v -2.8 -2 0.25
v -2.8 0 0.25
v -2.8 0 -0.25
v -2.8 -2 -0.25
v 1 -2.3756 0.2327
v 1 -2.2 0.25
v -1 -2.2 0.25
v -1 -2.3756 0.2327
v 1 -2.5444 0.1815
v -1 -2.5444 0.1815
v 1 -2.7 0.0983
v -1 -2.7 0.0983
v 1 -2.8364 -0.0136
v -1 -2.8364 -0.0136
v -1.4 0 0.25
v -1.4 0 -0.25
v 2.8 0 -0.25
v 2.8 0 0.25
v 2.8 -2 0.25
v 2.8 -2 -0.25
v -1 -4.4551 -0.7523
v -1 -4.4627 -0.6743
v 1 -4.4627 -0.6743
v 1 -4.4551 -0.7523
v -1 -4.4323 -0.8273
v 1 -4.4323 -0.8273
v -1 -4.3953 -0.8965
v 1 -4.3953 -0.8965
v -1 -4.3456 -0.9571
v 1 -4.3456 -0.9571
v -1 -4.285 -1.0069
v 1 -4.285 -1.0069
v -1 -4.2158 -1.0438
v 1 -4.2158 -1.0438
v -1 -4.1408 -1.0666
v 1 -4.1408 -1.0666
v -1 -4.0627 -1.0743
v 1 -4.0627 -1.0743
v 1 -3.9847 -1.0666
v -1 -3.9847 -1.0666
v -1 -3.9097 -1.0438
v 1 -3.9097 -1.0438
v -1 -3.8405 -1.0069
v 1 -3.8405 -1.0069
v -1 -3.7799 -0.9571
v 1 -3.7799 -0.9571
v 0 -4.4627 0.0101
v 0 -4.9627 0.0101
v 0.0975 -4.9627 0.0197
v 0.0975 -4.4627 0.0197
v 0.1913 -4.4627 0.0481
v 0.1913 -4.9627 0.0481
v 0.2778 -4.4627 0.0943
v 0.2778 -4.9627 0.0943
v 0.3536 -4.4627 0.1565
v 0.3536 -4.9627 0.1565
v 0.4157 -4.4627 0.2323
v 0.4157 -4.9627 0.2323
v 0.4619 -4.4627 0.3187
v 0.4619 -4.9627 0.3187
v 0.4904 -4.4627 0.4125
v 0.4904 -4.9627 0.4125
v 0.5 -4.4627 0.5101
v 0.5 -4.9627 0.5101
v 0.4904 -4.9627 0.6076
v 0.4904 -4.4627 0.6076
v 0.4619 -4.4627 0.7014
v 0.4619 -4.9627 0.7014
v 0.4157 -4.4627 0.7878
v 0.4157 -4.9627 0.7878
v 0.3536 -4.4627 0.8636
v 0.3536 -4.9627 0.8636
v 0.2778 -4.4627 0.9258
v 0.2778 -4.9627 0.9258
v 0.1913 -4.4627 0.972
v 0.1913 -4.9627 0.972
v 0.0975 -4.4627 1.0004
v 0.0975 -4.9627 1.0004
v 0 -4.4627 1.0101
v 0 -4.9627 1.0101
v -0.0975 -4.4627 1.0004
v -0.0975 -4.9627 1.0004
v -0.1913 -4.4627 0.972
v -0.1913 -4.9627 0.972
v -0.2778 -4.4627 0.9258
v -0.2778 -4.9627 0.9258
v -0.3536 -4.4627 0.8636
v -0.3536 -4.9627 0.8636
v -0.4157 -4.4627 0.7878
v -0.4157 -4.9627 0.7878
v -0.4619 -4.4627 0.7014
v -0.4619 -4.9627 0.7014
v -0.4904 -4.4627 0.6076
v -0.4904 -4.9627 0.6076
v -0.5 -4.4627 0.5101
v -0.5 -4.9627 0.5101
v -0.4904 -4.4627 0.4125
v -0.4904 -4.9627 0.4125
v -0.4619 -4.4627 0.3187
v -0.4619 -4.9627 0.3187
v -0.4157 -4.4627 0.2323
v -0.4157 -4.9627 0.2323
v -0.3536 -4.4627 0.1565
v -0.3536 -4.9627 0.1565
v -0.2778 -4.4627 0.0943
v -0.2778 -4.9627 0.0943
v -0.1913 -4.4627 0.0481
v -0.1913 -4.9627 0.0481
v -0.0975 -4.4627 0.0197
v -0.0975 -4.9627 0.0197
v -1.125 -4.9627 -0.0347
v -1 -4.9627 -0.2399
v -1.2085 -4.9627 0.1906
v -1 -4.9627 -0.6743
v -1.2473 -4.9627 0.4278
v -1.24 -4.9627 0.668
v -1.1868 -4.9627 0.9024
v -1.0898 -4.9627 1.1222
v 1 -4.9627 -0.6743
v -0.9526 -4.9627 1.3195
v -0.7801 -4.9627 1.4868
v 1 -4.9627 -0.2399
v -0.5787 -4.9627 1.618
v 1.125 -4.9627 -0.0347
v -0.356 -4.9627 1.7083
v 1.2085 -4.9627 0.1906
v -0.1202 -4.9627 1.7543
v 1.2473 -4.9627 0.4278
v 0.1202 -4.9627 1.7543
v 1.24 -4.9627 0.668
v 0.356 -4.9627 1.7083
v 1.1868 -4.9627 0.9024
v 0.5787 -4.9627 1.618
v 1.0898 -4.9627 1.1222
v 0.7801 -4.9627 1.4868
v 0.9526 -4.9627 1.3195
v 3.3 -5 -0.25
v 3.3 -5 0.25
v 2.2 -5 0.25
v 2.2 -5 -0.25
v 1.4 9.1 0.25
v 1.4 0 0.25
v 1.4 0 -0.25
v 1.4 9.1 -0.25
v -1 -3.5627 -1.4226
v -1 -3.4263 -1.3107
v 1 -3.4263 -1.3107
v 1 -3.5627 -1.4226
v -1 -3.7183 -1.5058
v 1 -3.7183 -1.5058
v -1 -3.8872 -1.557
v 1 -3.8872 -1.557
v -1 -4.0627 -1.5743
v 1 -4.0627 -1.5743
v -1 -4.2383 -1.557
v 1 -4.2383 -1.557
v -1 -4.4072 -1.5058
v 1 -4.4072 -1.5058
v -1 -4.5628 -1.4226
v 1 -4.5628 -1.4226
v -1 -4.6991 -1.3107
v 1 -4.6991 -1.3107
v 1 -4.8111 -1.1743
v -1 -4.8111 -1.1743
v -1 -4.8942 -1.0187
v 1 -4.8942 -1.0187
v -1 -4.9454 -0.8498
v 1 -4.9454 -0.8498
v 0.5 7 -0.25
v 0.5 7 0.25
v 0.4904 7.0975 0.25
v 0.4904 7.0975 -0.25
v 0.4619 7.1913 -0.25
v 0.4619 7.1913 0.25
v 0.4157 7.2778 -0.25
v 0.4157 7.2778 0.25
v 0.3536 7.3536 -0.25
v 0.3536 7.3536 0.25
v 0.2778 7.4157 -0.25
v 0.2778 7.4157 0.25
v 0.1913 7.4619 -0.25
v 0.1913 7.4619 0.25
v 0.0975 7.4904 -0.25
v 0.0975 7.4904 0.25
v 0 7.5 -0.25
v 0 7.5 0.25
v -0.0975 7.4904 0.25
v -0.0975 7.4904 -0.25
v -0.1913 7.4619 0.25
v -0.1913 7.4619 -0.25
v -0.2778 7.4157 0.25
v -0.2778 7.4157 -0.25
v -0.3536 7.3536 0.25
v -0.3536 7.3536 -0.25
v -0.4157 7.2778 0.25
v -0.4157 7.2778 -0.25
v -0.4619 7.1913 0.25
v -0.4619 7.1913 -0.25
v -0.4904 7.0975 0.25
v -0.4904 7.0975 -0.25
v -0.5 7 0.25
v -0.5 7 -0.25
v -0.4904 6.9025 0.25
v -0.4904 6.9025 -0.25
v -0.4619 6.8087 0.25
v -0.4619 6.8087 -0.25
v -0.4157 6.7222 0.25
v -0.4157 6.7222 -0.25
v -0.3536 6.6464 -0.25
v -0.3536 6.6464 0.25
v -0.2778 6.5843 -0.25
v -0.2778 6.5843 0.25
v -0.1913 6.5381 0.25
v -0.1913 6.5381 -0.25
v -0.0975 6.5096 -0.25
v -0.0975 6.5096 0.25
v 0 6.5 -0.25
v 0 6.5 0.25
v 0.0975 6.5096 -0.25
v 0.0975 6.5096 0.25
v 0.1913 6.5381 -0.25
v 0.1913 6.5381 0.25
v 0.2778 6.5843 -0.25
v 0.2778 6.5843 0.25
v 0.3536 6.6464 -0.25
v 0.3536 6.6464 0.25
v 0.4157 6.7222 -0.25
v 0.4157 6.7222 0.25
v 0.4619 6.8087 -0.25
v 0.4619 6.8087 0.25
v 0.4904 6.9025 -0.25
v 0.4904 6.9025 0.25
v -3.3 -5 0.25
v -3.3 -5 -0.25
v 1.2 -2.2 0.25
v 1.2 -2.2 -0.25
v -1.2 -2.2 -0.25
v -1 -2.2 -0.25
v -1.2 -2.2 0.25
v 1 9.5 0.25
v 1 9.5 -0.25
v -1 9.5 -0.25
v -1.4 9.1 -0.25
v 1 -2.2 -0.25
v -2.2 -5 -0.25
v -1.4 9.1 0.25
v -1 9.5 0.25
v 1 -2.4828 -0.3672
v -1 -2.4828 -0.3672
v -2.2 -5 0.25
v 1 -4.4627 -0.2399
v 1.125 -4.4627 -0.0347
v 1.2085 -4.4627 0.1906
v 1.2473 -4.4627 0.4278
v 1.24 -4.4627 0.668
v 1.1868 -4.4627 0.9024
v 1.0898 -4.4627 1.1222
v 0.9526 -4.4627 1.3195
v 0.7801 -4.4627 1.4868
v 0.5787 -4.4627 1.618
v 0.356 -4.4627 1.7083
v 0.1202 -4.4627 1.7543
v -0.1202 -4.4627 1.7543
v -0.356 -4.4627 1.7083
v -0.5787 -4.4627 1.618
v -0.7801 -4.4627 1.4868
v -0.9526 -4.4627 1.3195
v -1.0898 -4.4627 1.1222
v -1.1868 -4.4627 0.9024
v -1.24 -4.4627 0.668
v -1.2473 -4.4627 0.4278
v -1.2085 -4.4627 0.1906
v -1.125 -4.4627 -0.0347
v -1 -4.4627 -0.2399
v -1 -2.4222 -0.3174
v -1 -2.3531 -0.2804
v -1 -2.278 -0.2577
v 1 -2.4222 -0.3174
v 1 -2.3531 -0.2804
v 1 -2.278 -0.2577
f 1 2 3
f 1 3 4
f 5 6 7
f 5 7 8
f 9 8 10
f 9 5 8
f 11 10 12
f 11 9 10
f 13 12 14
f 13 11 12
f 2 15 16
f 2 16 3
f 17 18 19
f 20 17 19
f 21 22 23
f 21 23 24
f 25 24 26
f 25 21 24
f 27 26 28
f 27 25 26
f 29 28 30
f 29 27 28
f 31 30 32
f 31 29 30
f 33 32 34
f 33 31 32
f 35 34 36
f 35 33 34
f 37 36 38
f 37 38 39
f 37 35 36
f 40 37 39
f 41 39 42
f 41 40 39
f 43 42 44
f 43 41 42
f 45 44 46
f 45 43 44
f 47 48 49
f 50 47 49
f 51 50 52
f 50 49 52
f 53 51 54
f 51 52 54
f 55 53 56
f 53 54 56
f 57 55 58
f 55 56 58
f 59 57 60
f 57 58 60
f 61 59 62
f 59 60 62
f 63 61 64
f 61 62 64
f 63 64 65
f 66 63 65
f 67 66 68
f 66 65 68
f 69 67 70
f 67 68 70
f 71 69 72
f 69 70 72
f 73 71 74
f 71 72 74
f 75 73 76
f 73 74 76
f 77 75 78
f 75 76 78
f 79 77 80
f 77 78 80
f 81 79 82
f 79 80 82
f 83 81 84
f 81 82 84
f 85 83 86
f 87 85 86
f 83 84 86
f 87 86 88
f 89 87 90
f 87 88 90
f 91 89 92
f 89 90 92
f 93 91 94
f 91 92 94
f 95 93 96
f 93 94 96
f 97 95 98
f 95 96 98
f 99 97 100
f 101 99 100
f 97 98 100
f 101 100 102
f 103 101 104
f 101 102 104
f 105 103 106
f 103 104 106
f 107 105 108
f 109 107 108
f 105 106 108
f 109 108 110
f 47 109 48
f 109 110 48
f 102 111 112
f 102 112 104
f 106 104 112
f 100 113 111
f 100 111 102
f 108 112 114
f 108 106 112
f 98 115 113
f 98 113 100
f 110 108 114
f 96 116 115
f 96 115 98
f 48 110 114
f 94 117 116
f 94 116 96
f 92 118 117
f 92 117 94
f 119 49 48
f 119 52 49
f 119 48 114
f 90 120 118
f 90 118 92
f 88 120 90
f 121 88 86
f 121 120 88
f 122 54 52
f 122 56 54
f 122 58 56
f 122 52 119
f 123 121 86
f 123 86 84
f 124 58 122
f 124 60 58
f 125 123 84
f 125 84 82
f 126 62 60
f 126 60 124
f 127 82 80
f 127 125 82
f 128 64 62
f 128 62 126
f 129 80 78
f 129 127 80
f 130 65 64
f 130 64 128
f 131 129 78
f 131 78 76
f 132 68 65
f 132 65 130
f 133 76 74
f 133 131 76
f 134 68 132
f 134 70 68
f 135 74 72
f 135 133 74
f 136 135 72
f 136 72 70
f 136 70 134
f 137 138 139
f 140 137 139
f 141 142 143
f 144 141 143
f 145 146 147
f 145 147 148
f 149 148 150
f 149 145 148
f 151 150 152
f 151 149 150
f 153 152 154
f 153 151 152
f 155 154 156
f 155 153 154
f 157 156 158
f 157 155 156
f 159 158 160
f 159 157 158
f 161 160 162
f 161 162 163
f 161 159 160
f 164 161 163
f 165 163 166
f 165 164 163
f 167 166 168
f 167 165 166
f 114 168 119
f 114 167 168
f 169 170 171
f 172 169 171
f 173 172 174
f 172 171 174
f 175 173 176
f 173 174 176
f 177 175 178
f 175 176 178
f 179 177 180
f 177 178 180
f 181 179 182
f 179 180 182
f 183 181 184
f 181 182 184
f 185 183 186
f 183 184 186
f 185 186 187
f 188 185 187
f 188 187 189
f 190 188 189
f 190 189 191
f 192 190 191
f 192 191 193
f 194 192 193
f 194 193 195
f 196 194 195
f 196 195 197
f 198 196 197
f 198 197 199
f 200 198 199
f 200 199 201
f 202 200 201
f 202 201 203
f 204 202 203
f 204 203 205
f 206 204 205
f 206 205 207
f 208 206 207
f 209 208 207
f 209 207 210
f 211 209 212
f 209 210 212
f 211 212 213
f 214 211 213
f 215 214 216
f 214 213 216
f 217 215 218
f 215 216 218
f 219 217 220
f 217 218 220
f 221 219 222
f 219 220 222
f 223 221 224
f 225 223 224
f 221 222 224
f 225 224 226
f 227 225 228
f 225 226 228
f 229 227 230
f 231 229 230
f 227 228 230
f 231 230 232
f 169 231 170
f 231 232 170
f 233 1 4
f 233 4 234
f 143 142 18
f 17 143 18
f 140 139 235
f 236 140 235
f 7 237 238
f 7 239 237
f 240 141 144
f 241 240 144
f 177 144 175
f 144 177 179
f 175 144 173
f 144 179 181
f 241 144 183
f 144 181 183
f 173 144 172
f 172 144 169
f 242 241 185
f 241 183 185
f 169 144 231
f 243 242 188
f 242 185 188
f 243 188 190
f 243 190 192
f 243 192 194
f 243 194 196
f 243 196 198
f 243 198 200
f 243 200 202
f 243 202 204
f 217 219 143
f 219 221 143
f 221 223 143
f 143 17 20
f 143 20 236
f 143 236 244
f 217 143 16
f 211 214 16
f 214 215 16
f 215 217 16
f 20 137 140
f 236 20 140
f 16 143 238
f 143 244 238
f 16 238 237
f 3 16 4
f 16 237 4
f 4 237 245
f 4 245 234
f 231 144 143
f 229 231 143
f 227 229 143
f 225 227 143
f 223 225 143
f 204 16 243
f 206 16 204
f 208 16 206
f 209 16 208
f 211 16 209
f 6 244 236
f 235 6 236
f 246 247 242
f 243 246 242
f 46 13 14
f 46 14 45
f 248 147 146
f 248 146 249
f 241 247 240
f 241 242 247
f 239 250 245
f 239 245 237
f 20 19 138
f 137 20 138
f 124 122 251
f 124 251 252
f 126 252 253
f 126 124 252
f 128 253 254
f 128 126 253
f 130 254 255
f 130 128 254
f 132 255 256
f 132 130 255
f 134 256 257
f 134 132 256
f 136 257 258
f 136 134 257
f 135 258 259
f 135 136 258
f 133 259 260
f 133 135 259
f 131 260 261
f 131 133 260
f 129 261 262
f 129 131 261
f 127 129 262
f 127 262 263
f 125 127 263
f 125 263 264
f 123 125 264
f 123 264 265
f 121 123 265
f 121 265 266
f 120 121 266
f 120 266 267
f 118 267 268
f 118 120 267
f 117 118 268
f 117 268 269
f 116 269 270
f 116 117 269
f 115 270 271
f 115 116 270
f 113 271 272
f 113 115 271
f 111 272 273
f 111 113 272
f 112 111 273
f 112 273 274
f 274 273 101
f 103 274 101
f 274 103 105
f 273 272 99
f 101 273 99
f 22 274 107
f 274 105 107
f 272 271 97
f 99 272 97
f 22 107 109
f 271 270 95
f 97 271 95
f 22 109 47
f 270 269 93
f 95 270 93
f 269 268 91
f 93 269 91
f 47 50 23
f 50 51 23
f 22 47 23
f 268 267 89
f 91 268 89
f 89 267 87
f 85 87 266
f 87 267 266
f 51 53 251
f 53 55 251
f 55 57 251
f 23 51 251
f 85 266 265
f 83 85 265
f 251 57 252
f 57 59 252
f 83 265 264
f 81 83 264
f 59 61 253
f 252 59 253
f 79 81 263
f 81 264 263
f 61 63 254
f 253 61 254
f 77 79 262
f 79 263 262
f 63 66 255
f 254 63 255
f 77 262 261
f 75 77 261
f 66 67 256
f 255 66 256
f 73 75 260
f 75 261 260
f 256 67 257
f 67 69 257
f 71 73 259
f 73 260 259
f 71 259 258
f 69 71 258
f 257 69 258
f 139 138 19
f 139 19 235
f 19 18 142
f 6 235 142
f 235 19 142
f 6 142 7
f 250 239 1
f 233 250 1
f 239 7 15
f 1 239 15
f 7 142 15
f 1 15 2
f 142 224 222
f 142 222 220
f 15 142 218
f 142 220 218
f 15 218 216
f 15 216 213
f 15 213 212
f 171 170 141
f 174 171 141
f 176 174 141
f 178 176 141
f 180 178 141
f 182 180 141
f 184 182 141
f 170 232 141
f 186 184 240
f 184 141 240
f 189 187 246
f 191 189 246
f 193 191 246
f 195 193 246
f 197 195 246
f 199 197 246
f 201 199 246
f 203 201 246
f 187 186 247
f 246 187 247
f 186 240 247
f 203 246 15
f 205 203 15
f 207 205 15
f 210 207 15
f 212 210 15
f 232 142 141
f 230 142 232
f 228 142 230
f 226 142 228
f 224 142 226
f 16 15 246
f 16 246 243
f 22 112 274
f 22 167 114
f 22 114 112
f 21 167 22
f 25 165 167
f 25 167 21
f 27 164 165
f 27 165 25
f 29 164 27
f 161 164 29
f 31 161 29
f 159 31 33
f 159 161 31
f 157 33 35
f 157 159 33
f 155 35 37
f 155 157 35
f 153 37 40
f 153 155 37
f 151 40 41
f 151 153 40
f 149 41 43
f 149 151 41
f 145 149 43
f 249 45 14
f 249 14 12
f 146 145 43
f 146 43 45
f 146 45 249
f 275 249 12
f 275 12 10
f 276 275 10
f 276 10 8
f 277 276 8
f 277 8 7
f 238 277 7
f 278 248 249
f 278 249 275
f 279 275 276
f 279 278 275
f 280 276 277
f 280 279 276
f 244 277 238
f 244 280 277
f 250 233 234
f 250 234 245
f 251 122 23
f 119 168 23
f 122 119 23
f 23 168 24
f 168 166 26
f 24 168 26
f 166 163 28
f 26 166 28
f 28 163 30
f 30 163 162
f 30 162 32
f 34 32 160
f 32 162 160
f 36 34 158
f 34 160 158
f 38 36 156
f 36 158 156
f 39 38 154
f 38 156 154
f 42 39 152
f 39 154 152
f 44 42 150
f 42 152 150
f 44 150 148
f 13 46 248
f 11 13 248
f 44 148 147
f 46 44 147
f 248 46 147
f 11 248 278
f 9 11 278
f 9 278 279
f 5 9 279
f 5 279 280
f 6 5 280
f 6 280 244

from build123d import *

# Parameters (mm, degrees)
MAINBODYS_W                           = 2.8
MAINBODYS_H                           = 0.5
MAIN_BODY_DEPTH                       = 9.5
BOTTOM_OF_MAIN_BODY_REACH             = 11.606
BOTTOM_OF_MAIN_BODY_DIRECTION_2_REACH = 11.606
TOPHOLES_R                            = 0.5
TOP_HOLE_DEPTH                        = 11.069260152
F_45_DEGREE_FLANGE_DEPTH              = 2
BOTTOM_FLAT_FLANGE_DEPTH              = 2
EXTENDEDBOTTOMFLANGES_W               = 2
EXTENDEDBOTTOMFLANGES_H               = 0.5
EXTENDED_BOTTOM_FLANGE_DEPTH          = 0.4
BOSSEDCYLINDERBODYS_R                 = 0.5
BOSSED_CYLINDER_BODY_DEPTH            = 0.5
C_MAIN_BODY_SIZE                      = 0.4


# Sheet-metal steps are written as plain solids
with BuildPart() as part:
    # MainBodyS → MAIN BODY (new body)
    with BuildSketch(Plane(origin=(0, 0, 0), x_dir=(1, 0, 0), z_dir=(0, 1, 0))):
        Rectangle(MAINBODYS_W, MAINBODYS_H)
    extrude(amount=MAIN_BODY_DEPTH)

    # BOTTOM OF MAIN BODY: up to this face of the body (flat: up to its plane)
    bottom_of_main_body_end = Plane(part.part.faces().sort_by_distance((0, 4.75, 0.25))[0])
    # BottomMainBodyS → BOTTOM OF MAIN BODY (add, up to the picked face)
    with BuildSketch(Plane.XY, mode=Mode.PRIVATE) as bottom_of_main_body_sk1:
        Polygon((0, 0), (2.8, 0), (2.8, -2), (3.3, -5), (2.2, -5), (1.2, -2.2), (0, -2.2), align=None)
    bottom_of_main_body_tool1 = split(extrude(bottom_of_main_body_sk1.sketch, amount=BOTTOM_OF_MAIN_BODY_REACH, mode=Mode.PRIVATE), bisect_by=bottom_of_main_body_end, keep=Keep.BOTH, mode=Mode.PRIVATE)
    bottom_of_main_body = bottom_of_main_body_tool1.solids().sort_by(Axis((1.768001, -2.02309, 0), (0, 0, 1)))[0]
    add(bottom_of_main_body)

    # BOTTOM OF MAIN BODY direction 2: up to this face of the body (flat: up to its plane)
    bottom_of_main_body_direction_2_end = Plane(part.part.faces().sort_by_distance((0, 4.75, -0.25))[0])
    # BottomMainBodyS → BOTTOM OF MAIN BODY direction 2 (add, up to the picked face)
    with BuildSketch(Plane.XY, mode=Mode.PRIVATE) as bottom_of_main_body_direction_2_sk1:
        Polygon((0, 0), (2.8, 0), (2.8, -2), (3.3, -5), (2.2, -5), (1.2, -2.2), (0, -2.2), align=None)
    bottom_of_main_body_direction_2_tool1 = split(extrude(bottom_of_main_body_direction_2_sk1.sketch, amount=-BOTTOM_OF_MAIN_BODY_DIRECTION_2_REACH, mode=Mode.PRIVATE), bisect_by=bottom_of_main_body_direction_2_end, keep=Keep.BOTH, mode=Mode.PRIVATE)
    bottom_of_main_body_direction_2 = bottom_of_main_body_direction_2_tool1.solids().sort_by(Axis((1.768001, -2.02309, 0), (0, 0, -1)))[0]
    add(bottom_of_main_body_direction_2)

    # BMB HM: BOTTOM OF MAIN BODY, BOTTOM OF MAIN BODY direction 2 across plane
    add(bottom_of_main_body.mirror(Plane(origin=(0, 0, 0), x_dir=(0, 0, 1), z_dir=(1, 0, 0))))
    add(bottom_of_main_body_direction_2.mirror(Plane(origin=(0, 0, 0), x_dir=(0, 0, 1), z_dir=(1, 0, 0))))

    # TopHoleS → TOP HOLE (cut, through all)
    with BuildSketch(Plane.XY.offset(0.25)):
        with Locations((0, 7)):
            Circle(TOPHOLES_R)
    extrude(amount=-TOP_HOLE_DEPTH, mode=Mode.SUBTRACT)

    # 45 DEGREE FLANGE section (across the edge) → 45 DEGREE FLANGE (add)
    with BuildSketch(Plane(origin=(1, -2.365685425, -0.25), x_dir=(0, 0.7071067811865438, -0.7071067811865512), z_dir=(-1, 0, 0))):
        with BuildLine():
            Line((-0.5, 0.165685425), (-0.5, 1.5))
            Line((-0.5, 1.5), (0, 1.5))
            Line((0, 1.5), (0, 0.165685425))
            ThreePointArc((0, 0.165685425), (0.030448187, 0.012612052), (0.117157288, -0.117157288))
            Line((0.117157288, -0.117157288), (-0.236396103, -0.470710678))
            ThreePointArc((-0.236396103, -0.470710678), (-0.431491579, -0.178729664), (-0.5, 0.165685425))
        make_face()
    extrude(amount=F_45_DEGREE_FLANGE_DEPTH)

    # BOTTOM FLAT FLANGE section (across the edge) → BOTTOM FLAT FLANGE (add)
    with BuildSketch(Plane(origin=(-1, -4.4627417, -1.639949494), x_dir=(0, 1, 0), z_dir=(1, 0, 0))):
        with BuildLine():
            Line((-0.5, 0.965685425), (-0.5, 1))
            Line((-0.5, 1), (0, 1))
            Line((0, 1), (0, 0.965685425))
            ThreePointArc((0, 0.965685425), (0.246926627, 0.596133612), (0.682842712, 0.682842712))
            Line((0.682842712, 0.682842712), (1.036396103, 0.329289322))
            ThreePointArc((1.036396103, 0.329289322), (0.055584911, 0.134193846), (-0.5, 0.965685425))
        make_face()
    extrude(amount=BOTTOM_FLAT_FLANGE_DEPTH)

    # ExtendedBottomFlangeS → EXTENDED BOTTOM FLANGE (add)
    with BuildSketch(Plane.XY.offset(-0.639949494)):
        with Locations((0, -4.7127417)):
            Rectangle(EXTENDEDBOTTOMFLANGES_W, EXTENDEDBOTTOMFLANGES_H)
    extrude(amount=EXTENDED_BOTTOM_FLANGE_DEPTH)

    # BossedCylinderBodyS → BOSSED  CYLINDER BODY (add)
    with BuildSketch(Plane.XZ.offset(4.9627417)):
        with BuildLine():
            Line((-1, -0.239949494), (1, -0.239949494))
            ThreePointArc((1, -0.239949494), (0, 1.760050506), (-1, -0.239949494))
        make_face()
        with Locations(Location((0, 0.510050506, 0), (0, 0, 270))):
            Circle(BOSSEDCYLINDERBODYS_R, mode=Mode.SUBTRACT)
    extrude(amount=-BOSSED_CYLINDER_BODY_DEPTH)

    # C MAIN BODY
    c_main_body_edges = [part.edges().sort_by_distance(p)[0] for p in [
        (-1.4, 9.5, 0),
        (1.4, 9.5, 0),
    ]]
    chamfer(c_main_body_edges, length=C_MAIN_BODY_SIZE)


solid = part.part
